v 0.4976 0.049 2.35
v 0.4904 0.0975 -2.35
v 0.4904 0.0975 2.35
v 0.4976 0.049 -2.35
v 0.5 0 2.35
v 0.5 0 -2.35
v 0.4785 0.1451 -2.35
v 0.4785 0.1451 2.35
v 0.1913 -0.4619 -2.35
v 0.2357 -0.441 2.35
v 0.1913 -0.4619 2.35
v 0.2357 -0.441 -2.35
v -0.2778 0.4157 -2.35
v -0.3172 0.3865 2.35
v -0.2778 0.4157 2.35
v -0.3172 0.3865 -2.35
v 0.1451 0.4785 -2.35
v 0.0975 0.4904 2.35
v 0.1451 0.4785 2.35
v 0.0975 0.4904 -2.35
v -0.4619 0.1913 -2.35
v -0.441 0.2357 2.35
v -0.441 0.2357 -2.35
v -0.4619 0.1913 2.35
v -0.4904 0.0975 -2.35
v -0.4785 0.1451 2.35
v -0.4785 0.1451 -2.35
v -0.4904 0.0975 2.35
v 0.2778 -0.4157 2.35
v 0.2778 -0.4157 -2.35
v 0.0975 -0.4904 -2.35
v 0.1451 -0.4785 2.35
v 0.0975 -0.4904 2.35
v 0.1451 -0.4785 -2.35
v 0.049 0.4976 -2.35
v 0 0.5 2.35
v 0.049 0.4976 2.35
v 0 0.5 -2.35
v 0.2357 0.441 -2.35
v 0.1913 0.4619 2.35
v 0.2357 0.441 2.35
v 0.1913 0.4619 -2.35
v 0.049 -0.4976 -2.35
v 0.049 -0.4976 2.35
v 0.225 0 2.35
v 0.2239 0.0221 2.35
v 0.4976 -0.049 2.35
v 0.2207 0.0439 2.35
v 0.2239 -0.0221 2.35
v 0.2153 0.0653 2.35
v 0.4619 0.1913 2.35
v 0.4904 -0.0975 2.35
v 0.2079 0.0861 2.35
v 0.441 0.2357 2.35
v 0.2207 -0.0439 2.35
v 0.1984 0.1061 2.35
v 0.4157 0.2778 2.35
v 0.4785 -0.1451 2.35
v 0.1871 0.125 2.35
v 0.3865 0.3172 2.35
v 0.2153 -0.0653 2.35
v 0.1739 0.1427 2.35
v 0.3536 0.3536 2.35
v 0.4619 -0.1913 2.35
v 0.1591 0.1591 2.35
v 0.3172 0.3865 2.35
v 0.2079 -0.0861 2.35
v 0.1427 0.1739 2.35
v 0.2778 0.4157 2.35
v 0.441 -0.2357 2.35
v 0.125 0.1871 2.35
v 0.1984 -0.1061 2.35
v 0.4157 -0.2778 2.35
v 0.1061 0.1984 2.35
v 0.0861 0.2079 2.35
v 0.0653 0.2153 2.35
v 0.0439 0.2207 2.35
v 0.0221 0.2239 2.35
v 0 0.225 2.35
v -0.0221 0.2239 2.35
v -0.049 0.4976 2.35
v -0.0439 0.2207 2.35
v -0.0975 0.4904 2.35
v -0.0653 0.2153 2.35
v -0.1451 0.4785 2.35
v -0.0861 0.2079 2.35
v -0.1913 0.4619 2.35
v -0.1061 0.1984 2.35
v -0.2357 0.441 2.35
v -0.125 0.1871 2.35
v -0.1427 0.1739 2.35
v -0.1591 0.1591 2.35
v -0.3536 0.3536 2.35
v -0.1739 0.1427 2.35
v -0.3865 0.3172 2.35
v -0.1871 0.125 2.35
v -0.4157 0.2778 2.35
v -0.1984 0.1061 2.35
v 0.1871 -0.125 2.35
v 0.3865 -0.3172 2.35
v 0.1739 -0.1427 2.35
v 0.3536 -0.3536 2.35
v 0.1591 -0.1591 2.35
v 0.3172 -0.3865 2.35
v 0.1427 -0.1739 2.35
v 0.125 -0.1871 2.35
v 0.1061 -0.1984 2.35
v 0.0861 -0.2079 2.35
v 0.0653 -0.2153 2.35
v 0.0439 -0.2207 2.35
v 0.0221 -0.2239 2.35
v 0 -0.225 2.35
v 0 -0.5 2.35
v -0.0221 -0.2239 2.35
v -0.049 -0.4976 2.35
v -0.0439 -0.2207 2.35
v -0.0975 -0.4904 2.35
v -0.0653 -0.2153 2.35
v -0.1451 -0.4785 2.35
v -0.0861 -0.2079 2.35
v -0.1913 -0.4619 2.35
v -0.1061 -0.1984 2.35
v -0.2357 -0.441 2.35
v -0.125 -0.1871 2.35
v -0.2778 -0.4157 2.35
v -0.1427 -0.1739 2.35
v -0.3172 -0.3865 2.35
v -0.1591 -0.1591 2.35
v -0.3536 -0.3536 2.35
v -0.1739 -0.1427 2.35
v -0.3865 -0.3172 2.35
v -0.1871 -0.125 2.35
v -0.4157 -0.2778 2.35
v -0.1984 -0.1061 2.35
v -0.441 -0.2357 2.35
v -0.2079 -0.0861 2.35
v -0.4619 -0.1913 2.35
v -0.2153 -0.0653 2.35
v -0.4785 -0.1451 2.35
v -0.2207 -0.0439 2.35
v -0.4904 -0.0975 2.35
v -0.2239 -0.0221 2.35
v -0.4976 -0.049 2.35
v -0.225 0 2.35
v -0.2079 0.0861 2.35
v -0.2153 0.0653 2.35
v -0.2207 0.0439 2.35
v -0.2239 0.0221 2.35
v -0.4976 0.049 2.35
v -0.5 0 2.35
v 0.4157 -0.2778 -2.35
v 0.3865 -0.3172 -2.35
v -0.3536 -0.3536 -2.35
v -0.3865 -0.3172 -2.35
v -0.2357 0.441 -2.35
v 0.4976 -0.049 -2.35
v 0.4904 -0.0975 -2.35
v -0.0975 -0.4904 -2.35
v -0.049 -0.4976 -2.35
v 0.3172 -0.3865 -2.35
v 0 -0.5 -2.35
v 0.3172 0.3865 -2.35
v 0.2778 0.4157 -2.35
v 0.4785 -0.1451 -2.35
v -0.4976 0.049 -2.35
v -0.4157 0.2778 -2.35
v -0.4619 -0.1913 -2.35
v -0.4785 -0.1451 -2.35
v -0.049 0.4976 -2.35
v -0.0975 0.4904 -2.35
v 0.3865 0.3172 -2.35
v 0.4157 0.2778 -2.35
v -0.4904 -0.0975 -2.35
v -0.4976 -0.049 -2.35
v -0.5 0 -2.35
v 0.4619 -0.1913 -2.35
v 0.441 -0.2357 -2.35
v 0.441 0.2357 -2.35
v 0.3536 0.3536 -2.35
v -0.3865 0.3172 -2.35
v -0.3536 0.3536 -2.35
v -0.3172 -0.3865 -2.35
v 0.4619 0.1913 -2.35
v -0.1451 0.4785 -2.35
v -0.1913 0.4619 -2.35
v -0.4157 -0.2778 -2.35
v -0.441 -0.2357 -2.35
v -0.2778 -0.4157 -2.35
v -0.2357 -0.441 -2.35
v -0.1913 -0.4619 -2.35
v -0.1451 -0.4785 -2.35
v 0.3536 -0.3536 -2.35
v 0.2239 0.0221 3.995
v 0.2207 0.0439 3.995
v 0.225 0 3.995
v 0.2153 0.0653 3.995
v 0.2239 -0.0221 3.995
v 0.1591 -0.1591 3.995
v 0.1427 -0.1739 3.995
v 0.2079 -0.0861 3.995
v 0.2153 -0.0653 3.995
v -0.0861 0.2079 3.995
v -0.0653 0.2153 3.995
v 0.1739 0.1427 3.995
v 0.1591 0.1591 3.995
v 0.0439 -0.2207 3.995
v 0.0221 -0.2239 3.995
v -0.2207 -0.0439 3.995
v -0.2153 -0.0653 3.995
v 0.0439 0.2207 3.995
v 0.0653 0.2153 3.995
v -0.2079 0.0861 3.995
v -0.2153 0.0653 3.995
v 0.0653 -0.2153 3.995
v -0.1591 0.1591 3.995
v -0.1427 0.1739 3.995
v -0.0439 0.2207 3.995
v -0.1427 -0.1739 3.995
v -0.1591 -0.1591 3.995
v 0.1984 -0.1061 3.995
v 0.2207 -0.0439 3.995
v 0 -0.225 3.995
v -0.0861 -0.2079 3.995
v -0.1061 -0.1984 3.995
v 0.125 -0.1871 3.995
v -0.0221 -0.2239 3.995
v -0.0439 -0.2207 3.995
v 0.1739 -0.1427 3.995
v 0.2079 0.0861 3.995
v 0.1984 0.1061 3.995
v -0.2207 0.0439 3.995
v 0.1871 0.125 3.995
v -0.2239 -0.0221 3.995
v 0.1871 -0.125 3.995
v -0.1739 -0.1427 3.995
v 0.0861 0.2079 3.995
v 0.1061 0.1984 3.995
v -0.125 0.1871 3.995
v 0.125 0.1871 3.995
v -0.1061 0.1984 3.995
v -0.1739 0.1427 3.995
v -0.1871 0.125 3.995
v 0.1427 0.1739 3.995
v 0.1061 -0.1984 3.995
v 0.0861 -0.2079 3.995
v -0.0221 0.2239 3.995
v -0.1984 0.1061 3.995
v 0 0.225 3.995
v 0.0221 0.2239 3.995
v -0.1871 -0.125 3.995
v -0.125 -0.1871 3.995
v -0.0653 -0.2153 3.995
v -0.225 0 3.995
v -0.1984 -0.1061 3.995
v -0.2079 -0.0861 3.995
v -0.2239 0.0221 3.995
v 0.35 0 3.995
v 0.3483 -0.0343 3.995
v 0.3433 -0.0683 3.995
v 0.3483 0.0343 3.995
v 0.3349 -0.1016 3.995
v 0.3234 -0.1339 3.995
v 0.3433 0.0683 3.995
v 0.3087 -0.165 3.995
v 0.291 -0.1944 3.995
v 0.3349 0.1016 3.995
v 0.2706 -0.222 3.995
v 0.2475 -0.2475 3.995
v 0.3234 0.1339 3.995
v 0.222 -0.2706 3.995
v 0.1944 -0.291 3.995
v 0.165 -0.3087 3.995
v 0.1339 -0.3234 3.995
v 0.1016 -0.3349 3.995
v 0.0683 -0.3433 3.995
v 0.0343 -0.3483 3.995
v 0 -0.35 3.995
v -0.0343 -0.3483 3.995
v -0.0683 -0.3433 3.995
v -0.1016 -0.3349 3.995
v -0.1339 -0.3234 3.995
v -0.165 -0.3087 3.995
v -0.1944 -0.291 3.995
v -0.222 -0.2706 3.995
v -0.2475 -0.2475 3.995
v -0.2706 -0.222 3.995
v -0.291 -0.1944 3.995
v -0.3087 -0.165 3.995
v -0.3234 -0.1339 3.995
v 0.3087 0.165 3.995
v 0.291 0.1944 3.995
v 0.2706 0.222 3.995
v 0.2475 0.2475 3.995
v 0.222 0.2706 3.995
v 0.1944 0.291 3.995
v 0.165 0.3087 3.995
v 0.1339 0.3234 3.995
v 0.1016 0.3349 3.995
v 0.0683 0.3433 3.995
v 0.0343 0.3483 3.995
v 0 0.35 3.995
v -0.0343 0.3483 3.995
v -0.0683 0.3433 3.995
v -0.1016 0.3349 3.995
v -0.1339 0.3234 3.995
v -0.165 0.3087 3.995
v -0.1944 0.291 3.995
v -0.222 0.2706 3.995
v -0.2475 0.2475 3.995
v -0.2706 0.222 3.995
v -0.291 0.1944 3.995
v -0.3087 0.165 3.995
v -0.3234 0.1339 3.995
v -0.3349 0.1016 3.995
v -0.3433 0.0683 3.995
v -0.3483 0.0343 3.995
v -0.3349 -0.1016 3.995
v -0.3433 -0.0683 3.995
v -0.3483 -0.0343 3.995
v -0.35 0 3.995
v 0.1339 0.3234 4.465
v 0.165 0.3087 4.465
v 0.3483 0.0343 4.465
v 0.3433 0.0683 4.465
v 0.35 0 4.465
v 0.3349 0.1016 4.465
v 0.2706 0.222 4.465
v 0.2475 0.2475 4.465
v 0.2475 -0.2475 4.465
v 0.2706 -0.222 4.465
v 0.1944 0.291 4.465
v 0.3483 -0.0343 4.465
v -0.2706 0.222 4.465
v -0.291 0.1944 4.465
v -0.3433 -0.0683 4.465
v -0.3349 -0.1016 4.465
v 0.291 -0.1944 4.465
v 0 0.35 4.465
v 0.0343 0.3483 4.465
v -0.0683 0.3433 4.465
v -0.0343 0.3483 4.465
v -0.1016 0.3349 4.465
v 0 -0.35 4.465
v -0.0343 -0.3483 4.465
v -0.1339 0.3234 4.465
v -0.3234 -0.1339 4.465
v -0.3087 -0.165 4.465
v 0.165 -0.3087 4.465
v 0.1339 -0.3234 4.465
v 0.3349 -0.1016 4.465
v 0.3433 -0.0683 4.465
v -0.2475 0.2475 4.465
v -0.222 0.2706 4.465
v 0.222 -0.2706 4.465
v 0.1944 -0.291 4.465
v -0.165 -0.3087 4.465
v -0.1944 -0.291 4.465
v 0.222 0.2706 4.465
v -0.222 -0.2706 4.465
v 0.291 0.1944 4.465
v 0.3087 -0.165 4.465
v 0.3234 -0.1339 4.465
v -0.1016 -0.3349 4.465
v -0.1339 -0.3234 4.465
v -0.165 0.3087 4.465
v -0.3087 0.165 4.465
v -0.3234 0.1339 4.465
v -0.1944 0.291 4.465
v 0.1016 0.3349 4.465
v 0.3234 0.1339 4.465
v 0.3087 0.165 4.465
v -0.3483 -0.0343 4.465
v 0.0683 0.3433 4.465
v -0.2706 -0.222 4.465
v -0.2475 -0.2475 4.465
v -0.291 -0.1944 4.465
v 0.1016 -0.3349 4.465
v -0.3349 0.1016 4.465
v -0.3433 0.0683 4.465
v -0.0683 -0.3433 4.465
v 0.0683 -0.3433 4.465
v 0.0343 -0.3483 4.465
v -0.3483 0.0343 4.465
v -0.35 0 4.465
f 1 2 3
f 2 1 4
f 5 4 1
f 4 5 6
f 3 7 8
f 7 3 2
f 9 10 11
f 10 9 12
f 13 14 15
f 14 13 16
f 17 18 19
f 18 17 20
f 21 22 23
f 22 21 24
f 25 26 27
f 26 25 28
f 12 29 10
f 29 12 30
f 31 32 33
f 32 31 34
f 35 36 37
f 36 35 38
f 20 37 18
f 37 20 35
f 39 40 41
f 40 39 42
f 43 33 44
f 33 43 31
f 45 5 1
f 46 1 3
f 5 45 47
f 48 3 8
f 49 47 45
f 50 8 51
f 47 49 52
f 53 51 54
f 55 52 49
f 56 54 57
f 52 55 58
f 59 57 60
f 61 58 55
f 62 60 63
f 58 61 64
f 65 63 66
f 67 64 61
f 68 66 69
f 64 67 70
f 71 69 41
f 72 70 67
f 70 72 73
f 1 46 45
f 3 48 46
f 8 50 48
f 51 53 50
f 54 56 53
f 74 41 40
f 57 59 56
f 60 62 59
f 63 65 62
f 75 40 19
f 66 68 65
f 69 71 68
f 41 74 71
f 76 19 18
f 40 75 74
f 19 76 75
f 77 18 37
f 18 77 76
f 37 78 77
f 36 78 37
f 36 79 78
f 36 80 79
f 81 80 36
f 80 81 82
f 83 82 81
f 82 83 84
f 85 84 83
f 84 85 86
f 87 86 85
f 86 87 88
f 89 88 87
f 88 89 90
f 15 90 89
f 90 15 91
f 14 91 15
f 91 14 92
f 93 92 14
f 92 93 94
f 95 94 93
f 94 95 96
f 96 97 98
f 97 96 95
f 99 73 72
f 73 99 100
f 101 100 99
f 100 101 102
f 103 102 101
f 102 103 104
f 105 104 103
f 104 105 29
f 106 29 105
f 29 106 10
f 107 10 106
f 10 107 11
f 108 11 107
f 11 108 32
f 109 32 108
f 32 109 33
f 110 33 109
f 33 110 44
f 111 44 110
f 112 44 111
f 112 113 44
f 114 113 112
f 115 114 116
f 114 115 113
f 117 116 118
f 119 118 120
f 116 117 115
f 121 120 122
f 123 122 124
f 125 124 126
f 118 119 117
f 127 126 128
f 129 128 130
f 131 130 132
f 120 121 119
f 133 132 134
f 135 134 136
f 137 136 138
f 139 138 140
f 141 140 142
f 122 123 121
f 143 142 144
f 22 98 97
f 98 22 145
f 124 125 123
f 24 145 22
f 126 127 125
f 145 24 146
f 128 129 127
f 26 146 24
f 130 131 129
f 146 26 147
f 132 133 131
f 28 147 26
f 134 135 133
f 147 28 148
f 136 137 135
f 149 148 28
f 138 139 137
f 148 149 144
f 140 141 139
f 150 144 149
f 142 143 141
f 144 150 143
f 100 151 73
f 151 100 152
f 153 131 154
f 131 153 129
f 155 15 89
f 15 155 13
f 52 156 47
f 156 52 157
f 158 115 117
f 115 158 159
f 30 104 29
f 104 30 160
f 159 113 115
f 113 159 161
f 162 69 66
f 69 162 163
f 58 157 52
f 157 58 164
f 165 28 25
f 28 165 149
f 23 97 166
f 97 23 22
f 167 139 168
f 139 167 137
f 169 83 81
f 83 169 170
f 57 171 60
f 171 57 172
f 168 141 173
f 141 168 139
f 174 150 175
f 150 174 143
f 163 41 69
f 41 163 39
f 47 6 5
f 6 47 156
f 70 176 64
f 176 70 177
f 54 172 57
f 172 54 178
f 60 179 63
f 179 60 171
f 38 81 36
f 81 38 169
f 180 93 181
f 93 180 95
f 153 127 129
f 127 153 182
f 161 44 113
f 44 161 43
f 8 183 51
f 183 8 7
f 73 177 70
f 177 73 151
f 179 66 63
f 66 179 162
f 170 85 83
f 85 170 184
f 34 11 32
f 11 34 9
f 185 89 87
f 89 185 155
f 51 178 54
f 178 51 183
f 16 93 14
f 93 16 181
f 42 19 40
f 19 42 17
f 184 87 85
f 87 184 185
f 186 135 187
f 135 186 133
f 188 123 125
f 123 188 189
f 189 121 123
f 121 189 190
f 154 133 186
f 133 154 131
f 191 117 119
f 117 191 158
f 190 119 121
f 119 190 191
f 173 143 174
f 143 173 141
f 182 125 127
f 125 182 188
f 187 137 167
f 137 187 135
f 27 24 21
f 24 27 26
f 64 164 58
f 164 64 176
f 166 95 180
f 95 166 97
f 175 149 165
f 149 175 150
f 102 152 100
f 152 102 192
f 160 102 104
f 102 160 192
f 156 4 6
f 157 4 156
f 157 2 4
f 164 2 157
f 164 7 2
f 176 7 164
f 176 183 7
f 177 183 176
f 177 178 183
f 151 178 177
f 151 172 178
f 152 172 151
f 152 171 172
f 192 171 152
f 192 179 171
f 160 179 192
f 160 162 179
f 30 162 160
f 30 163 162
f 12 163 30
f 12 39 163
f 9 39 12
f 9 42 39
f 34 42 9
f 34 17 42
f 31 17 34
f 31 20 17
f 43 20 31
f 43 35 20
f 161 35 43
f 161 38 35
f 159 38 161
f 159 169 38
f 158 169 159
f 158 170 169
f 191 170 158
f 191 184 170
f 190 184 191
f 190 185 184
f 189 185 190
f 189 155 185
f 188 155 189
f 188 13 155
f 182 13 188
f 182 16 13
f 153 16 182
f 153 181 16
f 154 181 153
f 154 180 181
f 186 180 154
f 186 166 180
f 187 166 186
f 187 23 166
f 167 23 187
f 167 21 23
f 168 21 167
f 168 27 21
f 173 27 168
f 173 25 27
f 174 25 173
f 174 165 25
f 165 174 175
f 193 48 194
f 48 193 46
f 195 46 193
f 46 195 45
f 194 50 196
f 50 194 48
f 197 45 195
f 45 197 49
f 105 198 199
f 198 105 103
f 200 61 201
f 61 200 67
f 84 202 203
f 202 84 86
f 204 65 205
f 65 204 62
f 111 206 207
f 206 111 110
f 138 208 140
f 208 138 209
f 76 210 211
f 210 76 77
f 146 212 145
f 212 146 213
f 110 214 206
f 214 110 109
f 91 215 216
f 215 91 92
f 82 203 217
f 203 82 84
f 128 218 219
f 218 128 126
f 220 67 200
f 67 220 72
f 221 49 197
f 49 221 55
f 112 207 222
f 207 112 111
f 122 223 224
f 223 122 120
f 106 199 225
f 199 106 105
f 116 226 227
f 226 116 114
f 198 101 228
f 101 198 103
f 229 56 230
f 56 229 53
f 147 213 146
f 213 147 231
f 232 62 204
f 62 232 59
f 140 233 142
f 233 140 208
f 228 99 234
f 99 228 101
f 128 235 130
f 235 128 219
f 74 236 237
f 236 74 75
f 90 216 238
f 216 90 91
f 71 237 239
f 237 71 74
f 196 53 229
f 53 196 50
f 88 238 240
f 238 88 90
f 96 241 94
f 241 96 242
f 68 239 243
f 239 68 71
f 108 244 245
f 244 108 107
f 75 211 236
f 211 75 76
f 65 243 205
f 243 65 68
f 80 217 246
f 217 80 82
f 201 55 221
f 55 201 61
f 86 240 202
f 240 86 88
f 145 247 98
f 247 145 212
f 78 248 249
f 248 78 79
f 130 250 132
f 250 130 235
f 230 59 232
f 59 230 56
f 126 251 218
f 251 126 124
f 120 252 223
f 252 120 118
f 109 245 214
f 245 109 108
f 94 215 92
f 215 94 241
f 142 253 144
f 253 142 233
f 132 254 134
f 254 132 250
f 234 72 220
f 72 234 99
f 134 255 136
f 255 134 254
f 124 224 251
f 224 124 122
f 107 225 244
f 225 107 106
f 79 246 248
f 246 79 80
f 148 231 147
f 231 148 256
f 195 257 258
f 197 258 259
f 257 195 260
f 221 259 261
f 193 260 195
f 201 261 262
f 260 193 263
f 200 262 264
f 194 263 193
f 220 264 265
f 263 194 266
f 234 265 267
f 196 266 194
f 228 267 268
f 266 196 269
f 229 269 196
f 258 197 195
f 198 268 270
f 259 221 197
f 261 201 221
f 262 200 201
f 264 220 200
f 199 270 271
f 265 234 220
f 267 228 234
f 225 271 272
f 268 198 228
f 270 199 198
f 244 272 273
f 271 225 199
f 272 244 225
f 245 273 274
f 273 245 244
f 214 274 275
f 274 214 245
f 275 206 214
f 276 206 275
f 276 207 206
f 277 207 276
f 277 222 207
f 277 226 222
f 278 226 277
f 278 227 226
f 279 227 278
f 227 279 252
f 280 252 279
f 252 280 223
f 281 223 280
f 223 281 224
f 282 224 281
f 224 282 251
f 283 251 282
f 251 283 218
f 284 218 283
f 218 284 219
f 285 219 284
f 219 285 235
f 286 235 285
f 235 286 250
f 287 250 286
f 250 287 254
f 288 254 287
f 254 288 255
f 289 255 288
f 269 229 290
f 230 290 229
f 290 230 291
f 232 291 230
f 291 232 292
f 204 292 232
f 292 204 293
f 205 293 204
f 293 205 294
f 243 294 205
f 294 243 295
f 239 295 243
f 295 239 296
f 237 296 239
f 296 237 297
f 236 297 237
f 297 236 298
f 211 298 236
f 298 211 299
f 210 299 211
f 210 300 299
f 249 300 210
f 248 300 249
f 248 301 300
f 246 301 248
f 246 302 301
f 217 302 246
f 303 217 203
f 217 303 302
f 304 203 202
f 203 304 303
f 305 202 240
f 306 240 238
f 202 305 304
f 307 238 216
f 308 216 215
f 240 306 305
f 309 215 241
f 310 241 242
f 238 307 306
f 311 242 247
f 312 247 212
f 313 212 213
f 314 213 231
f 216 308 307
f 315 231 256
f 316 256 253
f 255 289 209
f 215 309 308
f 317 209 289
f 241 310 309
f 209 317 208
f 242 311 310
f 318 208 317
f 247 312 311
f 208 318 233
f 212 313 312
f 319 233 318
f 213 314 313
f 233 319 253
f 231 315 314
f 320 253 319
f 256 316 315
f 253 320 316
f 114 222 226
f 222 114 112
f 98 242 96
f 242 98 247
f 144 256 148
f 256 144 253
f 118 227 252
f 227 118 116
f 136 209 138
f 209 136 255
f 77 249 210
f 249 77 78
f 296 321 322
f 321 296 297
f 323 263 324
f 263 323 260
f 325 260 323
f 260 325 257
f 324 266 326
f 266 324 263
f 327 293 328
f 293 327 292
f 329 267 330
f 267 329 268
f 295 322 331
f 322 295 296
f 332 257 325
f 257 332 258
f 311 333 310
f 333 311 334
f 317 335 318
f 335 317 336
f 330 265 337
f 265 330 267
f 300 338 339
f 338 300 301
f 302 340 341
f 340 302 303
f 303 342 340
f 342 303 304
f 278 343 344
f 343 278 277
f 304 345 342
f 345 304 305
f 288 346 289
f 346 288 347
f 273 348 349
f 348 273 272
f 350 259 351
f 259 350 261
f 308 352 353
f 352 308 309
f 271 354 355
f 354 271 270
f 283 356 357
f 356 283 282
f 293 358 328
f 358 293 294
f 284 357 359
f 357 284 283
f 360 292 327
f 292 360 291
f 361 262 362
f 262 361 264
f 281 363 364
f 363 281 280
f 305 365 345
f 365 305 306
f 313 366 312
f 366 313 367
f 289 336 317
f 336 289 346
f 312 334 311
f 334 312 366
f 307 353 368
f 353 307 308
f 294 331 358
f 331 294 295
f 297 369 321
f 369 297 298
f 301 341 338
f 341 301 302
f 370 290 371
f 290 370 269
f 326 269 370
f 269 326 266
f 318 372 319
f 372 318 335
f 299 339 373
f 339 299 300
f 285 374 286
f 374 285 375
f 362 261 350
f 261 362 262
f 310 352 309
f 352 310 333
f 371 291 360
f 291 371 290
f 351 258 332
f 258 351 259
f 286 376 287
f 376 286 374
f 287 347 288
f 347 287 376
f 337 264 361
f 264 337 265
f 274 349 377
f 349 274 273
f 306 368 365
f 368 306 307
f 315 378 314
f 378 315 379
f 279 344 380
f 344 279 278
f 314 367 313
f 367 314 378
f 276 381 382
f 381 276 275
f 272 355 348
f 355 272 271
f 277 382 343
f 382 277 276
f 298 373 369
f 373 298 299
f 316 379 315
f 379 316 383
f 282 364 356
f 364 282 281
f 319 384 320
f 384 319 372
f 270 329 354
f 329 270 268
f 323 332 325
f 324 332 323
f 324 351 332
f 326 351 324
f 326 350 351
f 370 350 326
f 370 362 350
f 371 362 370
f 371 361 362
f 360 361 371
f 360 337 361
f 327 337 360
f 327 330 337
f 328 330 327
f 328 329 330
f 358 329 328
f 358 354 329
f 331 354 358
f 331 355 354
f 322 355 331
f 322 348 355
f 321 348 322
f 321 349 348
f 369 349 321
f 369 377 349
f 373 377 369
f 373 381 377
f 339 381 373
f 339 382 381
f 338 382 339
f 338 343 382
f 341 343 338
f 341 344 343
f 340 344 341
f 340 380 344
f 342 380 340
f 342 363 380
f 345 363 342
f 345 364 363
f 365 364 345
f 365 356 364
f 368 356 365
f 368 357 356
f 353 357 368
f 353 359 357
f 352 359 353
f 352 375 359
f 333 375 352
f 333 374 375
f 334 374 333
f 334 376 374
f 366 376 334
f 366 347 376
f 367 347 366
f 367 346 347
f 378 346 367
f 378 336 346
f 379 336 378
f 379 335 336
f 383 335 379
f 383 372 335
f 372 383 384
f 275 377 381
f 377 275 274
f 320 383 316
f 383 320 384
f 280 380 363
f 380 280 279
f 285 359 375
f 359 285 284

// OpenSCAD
$fn=64;

module toggle_switch(body_d=1.0, body_h=4.7) {
    shaft_d = body_d * 0.45;
    shaft_h = body_h * 0.35;
    cap_d   = body_d * 0.70;
    cap_h   = body_h * 0.10;

    union() {
        translate([0,0,-body_h/2])
            cylinder(d=body_d, h=body_h);

        translate([0,0, body_h/2])
            cylinder(d=shaft_d, h=shaft_h);

        translate([0,0, body_h/2 + shaft_h])
            cylinder(d=cap_d, h=cap_h);
    }
}

toggle_switch(1.0, 4.7);
